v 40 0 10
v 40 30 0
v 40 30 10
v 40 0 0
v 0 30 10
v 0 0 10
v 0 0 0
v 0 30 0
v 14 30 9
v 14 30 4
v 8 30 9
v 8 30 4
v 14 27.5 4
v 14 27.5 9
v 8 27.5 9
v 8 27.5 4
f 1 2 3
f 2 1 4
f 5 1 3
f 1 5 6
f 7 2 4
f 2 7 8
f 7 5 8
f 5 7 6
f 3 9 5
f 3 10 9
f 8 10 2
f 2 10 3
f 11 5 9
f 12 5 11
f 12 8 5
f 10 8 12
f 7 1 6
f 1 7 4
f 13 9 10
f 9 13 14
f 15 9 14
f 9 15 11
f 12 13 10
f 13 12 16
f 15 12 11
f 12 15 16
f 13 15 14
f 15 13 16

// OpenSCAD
// units=mm — generated by scad_emitter.py
// part=unnamed
$fn = 48;

difference() { cube([40, 30, 10]); translate([8, 27.5, 4]) cube([6, 3, 5]); }
